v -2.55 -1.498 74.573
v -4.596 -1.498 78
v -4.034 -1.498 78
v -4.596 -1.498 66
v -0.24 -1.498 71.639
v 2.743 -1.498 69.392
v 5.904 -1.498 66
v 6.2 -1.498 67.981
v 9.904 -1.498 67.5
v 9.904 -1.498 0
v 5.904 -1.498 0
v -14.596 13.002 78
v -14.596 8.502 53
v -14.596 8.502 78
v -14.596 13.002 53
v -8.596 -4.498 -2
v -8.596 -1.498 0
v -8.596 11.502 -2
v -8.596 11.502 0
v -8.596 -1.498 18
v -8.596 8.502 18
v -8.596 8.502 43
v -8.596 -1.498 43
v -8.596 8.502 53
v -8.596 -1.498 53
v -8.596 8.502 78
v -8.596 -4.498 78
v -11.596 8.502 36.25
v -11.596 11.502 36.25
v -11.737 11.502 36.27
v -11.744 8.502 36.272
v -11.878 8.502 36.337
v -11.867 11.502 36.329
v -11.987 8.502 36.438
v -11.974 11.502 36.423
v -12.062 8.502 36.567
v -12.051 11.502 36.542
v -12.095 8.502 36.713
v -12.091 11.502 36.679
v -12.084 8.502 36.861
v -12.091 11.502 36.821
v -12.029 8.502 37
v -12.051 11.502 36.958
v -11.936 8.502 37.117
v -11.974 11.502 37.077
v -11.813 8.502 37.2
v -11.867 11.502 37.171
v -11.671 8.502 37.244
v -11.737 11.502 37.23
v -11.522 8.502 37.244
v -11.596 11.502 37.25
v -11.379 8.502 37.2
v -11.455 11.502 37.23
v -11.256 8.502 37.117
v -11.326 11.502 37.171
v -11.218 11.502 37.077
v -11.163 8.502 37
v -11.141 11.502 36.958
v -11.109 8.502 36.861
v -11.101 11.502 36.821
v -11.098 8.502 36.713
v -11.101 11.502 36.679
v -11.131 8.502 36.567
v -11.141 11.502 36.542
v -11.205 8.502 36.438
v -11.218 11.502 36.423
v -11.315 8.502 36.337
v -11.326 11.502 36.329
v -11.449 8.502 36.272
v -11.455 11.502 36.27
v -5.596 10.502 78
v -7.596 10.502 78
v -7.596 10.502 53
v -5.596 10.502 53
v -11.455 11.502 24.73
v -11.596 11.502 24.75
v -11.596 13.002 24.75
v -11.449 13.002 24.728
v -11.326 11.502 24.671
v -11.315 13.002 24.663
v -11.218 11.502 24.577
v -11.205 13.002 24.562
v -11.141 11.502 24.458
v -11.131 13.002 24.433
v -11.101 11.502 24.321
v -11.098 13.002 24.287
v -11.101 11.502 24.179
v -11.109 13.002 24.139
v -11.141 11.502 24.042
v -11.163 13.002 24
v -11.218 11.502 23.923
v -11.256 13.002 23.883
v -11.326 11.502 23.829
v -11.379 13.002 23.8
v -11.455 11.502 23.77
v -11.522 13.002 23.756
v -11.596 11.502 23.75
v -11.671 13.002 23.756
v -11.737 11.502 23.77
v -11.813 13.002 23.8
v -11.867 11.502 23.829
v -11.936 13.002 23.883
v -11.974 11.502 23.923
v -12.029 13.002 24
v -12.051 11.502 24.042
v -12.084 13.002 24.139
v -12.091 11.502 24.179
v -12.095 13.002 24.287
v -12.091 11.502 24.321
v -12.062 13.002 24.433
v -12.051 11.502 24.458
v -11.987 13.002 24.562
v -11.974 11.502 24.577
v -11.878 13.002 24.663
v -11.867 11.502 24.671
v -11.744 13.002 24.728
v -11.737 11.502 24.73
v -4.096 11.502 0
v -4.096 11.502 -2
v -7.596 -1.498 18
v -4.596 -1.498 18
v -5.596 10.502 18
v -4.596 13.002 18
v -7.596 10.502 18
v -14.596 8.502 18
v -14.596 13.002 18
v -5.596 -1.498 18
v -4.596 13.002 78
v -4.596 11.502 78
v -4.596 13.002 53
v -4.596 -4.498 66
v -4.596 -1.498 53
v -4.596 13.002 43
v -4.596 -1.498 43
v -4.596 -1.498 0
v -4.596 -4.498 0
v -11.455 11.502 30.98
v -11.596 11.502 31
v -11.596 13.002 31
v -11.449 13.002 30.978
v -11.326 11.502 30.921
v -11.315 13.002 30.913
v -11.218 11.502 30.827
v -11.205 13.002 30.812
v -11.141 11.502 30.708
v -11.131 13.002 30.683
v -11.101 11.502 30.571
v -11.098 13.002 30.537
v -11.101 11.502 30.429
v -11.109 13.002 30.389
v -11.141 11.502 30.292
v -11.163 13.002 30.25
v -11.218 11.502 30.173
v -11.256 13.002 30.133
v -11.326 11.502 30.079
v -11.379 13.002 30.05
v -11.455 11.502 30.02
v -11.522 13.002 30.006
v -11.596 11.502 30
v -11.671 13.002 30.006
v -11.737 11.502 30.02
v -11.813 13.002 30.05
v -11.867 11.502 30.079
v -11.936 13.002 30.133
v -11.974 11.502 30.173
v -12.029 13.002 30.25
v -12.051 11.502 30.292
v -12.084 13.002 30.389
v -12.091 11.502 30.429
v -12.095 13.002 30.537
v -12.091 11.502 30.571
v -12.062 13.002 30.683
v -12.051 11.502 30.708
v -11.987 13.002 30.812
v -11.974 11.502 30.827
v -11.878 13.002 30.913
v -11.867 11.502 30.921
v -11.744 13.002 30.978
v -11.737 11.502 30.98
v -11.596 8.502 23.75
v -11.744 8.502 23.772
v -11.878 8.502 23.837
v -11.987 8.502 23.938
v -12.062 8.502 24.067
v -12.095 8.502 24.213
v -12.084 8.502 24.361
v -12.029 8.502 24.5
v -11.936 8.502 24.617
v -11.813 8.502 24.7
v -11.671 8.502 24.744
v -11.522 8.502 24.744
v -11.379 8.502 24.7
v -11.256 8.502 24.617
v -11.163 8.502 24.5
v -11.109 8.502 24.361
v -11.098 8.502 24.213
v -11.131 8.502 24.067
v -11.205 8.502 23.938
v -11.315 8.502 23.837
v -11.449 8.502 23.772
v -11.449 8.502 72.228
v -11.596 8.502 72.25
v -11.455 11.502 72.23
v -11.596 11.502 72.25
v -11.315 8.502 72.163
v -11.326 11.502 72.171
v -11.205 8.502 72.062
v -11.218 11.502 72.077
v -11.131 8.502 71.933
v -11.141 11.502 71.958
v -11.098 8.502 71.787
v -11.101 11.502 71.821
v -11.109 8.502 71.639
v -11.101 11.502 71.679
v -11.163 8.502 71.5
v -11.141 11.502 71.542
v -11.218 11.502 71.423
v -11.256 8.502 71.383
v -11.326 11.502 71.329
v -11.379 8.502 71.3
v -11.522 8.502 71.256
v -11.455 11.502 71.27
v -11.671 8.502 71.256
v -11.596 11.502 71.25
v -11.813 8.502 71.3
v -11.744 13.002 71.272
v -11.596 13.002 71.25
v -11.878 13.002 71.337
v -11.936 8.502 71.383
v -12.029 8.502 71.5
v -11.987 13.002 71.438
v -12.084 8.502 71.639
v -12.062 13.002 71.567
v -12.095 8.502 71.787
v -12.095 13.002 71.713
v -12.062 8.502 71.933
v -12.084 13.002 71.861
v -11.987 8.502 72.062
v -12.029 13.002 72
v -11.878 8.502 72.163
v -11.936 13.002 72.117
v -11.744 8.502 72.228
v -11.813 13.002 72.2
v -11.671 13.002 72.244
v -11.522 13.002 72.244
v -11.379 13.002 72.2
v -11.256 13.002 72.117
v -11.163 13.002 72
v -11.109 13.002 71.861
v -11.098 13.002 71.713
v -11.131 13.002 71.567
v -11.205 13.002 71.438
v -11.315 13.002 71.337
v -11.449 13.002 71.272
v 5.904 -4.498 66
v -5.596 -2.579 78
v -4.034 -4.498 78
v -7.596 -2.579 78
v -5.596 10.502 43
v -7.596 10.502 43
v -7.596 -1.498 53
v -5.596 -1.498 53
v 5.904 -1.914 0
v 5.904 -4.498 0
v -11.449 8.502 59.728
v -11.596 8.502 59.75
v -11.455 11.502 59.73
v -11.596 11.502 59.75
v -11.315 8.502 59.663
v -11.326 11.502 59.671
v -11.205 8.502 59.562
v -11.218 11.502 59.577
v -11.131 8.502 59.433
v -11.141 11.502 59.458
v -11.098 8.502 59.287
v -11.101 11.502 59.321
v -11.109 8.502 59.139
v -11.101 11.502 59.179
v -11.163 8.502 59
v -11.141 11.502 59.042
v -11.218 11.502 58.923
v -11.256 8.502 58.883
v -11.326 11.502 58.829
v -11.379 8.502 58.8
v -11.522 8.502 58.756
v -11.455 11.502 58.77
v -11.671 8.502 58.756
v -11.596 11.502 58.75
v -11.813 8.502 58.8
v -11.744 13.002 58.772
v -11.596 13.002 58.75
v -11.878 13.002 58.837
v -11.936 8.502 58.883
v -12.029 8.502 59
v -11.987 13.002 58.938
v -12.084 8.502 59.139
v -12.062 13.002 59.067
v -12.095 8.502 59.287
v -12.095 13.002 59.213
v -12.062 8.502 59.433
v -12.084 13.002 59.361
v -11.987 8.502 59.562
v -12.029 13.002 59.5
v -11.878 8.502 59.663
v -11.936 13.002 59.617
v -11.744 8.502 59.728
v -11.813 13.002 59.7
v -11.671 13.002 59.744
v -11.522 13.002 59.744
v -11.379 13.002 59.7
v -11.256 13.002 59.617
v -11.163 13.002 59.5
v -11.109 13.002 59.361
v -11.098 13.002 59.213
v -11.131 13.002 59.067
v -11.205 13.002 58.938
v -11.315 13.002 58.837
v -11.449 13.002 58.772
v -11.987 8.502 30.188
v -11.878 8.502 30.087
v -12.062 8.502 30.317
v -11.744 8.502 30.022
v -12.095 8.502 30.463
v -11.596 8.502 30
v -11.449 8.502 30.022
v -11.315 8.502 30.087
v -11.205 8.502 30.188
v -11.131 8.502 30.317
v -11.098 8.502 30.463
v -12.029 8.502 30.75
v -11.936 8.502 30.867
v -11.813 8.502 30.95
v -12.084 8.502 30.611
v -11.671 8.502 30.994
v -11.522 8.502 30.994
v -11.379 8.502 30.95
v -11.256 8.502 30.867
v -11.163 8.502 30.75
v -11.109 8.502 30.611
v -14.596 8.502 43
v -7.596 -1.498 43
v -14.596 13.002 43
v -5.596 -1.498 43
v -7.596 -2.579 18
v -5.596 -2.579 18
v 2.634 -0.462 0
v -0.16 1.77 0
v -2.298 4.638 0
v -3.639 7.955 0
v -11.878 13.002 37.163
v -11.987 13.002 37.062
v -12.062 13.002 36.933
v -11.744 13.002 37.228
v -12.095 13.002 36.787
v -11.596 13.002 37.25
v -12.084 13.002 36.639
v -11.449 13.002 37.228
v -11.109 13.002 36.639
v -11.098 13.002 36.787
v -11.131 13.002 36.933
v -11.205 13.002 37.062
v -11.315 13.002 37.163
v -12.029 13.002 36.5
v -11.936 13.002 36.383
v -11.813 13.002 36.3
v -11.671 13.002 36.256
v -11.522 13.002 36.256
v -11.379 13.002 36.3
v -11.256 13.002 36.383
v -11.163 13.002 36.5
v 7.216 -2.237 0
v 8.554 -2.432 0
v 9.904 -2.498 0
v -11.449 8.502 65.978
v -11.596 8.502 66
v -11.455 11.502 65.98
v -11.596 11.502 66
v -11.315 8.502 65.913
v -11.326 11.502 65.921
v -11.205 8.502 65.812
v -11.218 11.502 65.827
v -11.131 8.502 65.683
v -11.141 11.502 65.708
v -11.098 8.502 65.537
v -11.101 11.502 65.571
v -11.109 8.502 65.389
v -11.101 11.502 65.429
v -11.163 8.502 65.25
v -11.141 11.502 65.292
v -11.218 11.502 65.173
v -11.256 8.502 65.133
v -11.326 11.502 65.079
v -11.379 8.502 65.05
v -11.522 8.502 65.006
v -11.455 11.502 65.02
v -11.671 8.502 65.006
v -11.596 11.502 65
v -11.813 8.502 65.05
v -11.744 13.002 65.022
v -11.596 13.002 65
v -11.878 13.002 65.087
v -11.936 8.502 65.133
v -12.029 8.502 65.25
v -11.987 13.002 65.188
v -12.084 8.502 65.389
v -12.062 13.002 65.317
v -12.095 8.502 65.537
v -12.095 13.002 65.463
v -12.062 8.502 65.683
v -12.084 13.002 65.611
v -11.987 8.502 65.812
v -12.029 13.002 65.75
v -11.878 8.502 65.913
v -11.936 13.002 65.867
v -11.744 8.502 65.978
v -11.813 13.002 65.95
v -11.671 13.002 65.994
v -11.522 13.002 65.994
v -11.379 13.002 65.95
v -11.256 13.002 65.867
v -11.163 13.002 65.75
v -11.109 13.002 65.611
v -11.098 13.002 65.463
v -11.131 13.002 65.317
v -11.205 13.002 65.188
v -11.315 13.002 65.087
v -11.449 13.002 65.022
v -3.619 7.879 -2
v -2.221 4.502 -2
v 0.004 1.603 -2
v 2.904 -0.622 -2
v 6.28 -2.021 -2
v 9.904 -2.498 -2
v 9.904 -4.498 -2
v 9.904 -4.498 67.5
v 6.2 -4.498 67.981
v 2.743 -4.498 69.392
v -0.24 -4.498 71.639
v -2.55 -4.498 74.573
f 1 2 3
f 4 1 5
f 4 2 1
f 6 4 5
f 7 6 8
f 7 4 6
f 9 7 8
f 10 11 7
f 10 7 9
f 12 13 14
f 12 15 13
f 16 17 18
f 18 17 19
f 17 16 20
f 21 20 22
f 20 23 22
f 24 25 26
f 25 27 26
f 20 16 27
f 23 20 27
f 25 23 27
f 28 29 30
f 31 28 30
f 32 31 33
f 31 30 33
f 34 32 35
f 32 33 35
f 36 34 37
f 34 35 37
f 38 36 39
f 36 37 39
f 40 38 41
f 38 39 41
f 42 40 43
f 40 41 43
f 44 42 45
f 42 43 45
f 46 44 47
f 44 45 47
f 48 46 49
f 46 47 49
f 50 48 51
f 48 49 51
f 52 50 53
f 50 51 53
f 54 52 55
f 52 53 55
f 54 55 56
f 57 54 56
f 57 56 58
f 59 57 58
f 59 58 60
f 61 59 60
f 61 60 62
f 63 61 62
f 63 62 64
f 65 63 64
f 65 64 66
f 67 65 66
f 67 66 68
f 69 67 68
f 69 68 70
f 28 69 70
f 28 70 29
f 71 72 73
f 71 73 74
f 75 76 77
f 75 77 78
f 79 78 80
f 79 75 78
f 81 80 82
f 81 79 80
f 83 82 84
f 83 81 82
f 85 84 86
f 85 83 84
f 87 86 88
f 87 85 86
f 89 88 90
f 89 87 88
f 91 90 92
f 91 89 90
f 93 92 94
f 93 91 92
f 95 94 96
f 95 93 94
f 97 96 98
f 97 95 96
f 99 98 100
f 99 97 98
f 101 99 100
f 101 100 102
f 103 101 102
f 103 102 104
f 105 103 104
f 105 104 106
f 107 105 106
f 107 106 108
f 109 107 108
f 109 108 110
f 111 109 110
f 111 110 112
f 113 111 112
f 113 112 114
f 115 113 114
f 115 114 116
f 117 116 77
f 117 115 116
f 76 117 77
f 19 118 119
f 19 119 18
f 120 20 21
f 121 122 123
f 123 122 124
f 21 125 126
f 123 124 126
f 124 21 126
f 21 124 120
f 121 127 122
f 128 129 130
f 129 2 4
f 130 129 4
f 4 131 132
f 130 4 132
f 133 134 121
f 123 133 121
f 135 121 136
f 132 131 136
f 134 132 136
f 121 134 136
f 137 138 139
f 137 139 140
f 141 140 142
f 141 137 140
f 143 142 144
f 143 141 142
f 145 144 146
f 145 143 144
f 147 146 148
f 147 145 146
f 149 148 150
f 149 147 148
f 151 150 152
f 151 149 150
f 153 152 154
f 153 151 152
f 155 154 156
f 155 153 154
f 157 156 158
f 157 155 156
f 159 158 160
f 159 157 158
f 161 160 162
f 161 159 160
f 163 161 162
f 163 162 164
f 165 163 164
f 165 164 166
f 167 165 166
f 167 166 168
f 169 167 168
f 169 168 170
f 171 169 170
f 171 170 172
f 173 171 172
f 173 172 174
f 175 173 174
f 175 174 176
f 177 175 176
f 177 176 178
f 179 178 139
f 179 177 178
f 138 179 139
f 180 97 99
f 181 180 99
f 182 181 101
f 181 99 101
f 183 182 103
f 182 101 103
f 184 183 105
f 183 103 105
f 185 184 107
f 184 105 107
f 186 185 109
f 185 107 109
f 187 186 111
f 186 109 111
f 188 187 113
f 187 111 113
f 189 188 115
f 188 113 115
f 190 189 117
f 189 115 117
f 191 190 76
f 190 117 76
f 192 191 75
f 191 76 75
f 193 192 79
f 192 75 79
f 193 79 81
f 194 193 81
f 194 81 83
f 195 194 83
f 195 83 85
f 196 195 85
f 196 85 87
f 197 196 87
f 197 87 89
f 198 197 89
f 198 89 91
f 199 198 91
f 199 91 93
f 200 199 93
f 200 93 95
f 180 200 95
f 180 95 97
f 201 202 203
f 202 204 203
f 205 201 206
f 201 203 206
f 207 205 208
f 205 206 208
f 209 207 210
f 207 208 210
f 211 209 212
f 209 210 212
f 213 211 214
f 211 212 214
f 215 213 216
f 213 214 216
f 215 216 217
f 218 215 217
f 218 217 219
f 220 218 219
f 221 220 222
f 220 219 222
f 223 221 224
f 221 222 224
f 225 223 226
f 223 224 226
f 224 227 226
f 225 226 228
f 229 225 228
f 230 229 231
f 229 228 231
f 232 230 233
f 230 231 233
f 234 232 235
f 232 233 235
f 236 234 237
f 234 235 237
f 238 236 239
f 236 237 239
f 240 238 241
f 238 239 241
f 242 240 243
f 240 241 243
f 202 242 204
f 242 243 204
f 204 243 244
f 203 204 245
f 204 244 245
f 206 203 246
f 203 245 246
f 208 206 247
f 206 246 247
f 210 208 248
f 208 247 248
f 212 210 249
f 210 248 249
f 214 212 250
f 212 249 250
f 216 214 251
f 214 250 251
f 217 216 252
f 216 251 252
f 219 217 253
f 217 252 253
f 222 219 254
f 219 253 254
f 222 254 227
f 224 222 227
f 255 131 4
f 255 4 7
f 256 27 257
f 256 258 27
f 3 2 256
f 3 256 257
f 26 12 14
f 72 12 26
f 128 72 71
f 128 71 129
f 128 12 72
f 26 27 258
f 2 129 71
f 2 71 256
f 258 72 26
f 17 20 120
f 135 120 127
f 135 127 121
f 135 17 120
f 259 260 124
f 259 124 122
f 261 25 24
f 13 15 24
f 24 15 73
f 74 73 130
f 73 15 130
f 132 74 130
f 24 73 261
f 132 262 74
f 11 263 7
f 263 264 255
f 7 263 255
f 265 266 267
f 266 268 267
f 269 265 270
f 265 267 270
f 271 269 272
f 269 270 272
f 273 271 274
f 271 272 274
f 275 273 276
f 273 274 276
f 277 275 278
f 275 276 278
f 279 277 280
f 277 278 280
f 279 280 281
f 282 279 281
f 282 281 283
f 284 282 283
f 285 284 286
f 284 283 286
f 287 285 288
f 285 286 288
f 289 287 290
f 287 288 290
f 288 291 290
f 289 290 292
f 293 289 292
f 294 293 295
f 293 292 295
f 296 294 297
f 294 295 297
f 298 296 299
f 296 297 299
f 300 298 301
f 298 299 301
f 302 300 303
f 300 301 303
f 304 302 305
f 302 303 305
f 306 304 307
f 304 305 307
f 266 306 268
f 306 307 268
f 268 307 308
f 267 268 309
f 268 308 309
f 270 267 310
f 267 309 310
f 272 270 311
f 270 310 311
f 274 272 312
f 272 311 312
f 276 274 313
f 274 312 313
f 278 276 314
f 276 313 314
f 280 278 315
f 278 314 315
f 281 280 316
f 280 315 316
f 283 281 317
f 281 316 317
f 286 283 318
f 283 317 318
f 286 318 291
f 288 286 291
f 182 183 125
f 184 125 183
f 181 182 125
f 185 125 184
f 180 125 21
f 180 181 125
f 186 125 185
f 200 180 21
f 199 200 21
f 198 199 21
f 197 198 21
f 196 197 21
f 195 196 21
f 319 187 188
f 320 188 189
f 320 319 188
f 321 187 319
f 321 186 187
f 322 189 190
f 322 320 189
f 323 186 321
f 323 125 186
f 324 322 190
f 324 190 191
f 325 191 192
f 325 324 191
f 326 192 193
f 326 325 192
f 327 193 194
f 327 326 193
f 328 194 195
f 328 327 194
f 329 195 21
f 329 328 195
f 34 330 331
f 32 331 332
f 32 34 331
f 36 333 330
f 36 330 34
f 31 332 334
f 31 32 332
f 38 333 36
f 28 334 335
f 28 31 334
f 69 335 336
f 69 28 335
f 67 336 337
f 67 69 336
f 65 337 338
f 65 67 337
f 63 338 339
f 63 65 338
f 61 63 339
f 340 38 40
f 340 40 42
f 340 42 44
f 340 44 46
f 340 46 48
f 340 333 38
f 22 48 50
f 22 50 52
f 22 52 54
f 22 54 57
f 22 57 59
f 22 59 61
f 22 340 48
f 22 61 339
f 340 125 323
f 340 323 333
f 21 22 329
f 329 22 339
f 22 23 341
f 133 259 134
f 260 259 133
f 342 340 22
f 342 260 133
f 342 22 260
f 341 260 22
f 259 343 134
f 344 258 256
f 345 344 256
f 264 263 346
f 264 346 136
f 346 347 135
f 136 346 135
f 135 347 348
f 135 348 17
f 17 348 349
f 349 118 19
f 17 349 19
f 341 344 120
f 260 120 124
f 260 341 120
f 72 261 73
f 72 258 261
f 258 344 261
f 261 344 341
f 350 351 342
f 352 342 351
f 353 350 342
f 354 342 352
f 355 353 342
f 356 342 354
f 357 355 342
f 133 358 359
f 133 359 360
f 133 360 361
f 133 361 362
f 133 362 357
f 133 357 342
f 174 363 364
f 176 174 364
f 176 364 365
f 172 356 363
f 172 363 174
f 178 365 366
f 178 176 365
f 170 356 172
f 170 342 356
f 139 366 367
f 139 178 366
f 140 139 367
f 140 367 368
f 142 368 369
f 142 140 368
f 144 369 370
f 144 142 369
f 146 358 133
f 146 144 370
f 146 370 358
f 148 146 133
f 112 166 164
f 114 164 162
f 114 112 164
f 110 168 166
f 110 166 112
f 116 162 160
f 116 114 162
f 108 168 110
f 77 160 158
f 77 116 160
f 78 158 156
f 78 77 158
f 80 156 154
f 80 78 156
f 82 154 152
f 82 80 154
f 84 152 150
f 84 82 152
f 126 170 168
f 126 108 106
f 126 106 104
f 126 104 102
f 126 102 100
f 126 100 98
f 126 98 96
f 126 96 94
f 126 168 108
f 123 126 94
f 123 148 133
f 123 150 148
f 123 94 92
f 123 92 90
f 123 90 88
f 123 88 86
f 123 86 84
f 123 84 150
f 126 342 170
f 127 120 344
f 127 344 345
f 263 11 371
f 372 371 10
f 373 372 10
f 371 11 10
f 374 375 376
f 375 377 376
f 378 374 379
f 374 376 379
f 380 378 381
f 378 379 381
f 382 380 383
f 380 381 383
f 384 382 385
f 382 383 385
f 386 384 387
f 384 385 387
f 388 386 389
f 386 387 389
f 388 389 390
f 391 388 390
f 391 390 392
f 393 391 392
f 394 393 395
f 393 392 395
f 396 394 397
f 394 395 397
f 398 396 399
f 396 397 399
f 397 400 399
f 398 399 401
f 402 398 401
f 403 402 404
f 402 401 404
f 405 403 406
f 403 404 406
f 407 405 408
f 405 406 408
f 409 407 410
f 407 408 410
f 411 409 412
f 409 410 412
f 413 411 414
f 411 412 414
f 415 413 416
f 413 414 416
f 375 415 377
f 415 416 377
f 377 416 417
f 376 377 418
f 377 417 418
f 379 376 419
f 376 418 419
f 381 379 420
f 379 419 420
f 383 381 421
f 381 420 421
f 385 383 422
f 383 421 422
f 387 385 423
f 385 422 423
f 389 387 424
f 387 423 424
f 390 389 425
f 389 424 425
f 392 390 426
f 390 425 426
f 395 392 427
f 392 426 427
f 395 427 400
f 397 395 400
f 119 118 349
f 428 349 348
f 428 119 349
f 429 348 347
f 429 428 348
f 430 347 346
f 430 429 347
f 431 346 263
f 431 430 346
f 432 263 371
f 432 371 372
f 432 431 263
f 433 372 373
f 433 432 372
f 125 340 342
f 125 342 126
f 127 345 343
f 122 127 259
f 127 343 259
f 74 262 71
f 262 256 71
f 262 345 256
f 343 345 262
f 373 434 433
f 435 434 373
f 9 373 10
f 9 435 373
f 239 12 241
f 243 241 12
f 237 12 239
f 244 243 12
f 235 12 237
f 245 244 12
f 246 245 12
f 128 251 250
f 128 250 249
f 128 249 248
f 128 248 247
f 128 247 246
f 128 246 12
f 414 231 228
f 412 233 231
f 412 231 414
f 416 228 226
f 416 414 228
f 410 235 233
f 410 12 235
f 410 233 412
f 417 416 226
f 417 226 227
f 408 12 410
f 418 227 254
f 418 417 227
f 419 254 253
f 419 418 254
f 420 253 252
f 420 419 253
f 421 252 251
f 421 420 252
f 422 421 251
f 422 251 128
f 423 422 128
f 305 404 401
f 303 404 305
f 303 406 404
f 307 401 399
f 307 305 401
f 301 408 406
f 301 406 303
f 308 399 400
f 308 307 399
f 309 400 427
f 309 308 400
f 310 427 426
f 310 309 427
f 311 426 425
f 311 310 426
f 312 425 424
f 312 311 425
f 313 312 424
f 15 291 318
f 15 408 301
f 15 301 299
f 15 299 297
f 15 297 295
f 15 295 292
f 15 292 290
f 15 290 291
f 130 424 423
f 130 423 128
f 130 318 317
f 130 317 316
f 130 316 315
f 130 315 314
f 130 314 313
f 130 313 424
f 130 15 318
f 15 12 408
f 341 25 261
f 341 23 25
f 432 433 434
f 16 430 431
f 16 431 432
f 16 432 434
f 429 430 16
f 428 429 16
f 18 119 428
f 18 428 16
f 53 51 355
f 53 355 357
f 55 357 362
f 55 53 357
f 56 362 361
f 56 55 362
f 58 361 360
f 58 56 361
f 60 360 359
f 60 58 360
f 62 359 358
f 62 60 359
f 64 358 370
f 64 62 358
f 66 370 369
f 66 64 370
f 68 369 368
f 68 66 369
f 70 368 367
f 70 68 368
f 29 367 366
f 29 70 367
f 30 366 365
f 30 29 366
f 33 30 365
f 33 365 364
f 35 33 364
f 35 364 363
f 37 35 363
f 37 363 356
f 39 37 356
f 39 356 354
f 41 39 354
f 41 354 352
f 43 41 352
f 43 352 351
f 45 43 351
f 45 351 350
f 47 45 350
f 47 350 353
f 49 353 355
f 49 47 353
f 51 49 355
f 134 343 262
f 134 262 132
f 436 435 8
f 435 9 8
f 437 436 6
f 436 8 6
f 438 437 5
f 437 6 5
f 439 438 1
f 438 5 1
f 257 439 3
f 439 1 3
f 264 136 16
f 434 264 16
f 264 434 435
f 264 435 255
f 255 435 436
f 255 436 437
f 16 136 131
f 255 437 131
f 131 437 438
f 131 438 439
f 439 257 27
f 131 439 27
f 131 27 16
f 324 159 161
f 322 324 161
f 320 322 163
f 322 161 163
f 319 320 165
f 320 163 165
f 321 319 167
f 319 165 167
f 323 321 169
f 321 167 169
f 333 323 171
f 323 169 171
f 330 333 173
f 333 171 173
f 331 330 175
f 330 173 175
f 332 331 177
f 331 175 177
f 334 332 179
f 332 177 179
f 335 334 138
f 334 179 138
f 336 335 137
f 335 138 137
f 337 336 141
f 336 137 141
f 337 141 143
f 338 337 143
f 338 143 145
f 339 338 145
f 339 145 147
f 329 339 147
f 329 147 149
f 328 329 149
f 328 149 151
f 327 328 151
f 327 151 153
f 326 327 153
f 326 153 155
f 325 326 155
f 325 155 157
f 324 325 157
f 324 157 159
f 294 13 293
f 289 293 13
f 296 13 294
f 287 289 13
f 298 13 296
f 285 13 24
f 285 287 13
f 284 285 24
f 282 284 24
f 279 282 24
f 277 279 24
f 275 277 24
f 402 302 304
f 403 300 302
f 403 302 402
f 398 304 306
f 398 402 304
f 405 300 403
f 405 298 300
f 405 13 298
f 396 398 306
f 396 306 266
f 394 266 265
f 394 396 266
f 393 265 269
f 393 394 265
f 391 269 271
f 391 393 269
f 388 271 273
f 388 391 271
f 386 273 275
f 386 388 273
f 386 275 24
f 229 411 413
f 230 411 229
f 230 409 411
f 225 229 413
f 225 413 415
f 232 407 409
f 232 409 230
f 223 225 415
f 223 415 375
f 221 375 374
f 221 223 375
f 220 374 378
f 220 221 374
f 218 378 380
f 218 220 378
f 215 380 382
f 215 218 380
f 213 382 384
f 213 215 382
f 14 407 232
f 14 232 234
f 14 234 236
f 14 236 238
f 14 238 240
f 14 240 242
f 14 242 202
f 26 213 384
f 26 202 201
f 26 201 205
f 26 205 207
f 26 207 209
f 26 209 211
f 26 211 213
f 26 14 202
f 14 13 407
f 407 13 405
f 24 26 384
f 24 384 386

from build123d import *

# Parameters (mm, degrees)
SALIENTE_EXTRUIR1_DEPTH = 82
CROQUIS3_W              = 10
CROQUIS3_H              = 25
SALIENTE_EXTRUIR2_DEPTH = 1.5
CROQUIS4_W              = 18.5
CROQUIS4_H              = 16
SALIENTE_EXTRUIR3_DEPTH = 2
CROQUIS5_R              = 14.5
CORTAR_EXTRUIR1_DEPTH   = 10
CROQUIS9_R              = 0.5
CORTAR_EXTRUIR5_DEPTH   = 10
CORTAR_EXTRUIR6_DEPTH   = 2
CROQUIS11_W             = 10
CROQUIS11_H             = 13
CROQUIS11_W_2           = 18
CROQUIS11_W_3           = 8.121089167
CROQUIS11_H_2           = 20.058238939
CORTAR_EXTRUIR7_DEPTH   = 10
CROQUIS12_W             = 2
CROQUIS12_H             = 13.081043671
CORTAR_EXTRUIR8_DEPTH   = 60
CROQUIS13_W             = 10.5
CROQUIS13_H             = 66
CORTAR_EXTRUIR9_DEPTH   = 12
CROQUIS14_W             = 6
CROQUIS14_H             = 25
SALIENTE_EXTRUIR4_DEPTH = 3
CROQUIS15_R             = 0.5
CORTAR_EXTRUIR10_DEPTH  = 81.950919234


with BuildPart() as part:
    # Croquis2 → Saliente-Extruir1 (new body)
    with BuildSketch(Plane.XY):
        Polygon((-4.596277774, 11.502403514), (-4.596277774, -1.497596486), (9.903722226, -1.497596486), (9.903722226, -4.497596486), (-4.596277774, -4.497596486), (-8.596277774, -4.497596486), (-8.596277774, 11.502403514), align=None)
    extrude(amount=SALIENTE_EXTRUIR1_DEPTH)

    # Croquis3 → Saliente-Extruir2 (add)
    with BuildSketch(Plane(origin=(0, 11.502403514, 0), x_dir=(1, 0, 0), z_dir=(0, 1, 0))):
        with Locations((-9.596277774, -30.5)):
            Rectangle(CROQUIS3_W, CROQUIS3_H)
        with Locations((-9.596277774, -65.5)):
            Rectangle(CROQUIS3_W, CROQUIS3_H)
    extrude(amount=SALIENTE_EXTRUIR2_DEPTH)

    # Croquis4 → Saliente-Extruir3 (add)
    with BuildSketch(Plane(origin=(0, 0, 0), x_dir=(-1, 0, 0), z_dir=(0, 0, -1))):
        with Locations((-0.653722226, 3.502403514)):
            Rectangle(CROQUIS4_W, CROQUIS4_H)
    extrude(amount=SALIENTE_EXTRUIR3_DEPTH)

    # Croquis5 → Cortar-Extruir1 (cut)
    with BuildSketch(Plane(origin=(0, -1.497596486, 0), x_dir=(1, 0, 0), z_dir=(0, 1, 0))):
        with Locations((9.903722226, -82)):
            Circle(CROQUIS5_R)
    extrude(amount=-CORTAR_EXTRUIR1_DEPTH, mode=Mode.SUBTRACT)

    # Croquis9 → Cortar-Extruir5 (cut)
    with BuildSketch(Plane.XZ.offset(-11.502403514)):
        with Locations(Location((-11.596277774, 65.5, 0), (0, 0, 270))):
            Circle(CROQUIS9_R)
        with Locations(Location((-11.596277774, 59.25, 0), (0, 0, 270))):
            Circle(CROQUIS9_R)
        with Locations(Location((-11.596277774, 71.75, 0), (0, 0, 270))):
            Circle(CROQUIS9_R)
    cortar_extruir5 = extrude(amount=-CORTAR_EXTRUIR5_DEPTH, mode=Mode.SUBTRACT)

    # Simetría1: Cortar-Extruir5 across plane
    add(cortar_extruir5.mirror(Plane(origin=(0, 0, 48), x_dir=(1, 0, 0), z_dir=(0, 0, -1))), mode=Mode.SUBTRACT)

    # Croquis10 → Cortar-Extruir6 (cut)
    with BuildSketch(Plane(origin=(0, 0, -2), x_dir=(-1, 0, 0), z_dir=(0, 0, -1))):
        with BuildLine():
            Line((-9.903722226, -2.497596486), (-9.903722226, 11.502403514))
            Line((-9.903722226, 11.502403514), (4.096277774, 11.502403514))
            ThreePointArc((4.096277774, 11.502403514), (-0.00422729, 1.602908577), (-9.903722226, -2.497596486))
        make_face()
    extrude(amount=-CORTAR_EXTRUIR6_DEPTH, mode=Mode.SUBTRACT)

    # Croquis11 → Cortar-Extruir7 (cut)
    with BuildSketch(Plane.ZY.offset(8.596277774)):
        with Locations((48, 5.002403514)):
            Rectangle(CROQUIS11_W, CROQUIS11_H)
        with Locations((9, 5.002403514)):
            Rectangle(CROQUIS11_W_2, CROQUIS11_H)
        with Locations((82.060544584, 1.473284045)):
            Rectangle(CROQUIS11_W_3, CROQUIS11_H_2)
    extrude(amount=-CORTAR_EXTRUIR7_DEPTH, mode=Mode.SUBTRACT)

    # Croquis12 → Cortar-Extruir8 (cut)
    with BuildSketch(Plane.XY.offset(78)):
        with Locations((-6.596277774, 3.961881679)):
            Rectangle(CROQUIS12_W, CROQUIS12_H)
    extrude(amount=-CORTAR_EXTRUIR8_DEPTH, mode=Mode.SUBTRACT)

    # Croquis13 → Cortar-Extruir9 (cut)
    with BuildSketch(Plane.XZ.offset(4.497596486)):
        with Locations((0.653722226, 33)):
            Rectangle(CROQUIS13_W, CROQUIS13_H)
    extrude(amount=-CORTAR_EXTRUIR9_DEPTH, mode=Mode.SUBTRACT)

    # Croquis14 → Saliente-Extruir4 (add)
    with BuildSketch(Plane.XZ.offset(-11.502403514)):
        with Locations((-11.596277774, 65.5)):
            Rectangle(CROQUIS14_W, CROQUIS14_H)
        with Locations((-11.596277774, 30.5)):
            Rectangle(CROQUIS14_W, CROQUIS14_H)
    extrude(amount=SALIENTE_EXTRUIR4_DEPTH)

    # Croquis15 → Cortar-Extruir10 (cut, through all)
    with BuildSketch(Plane(origin=(0, 11.502403514, 0), x_dir=(1, 0, 0), z_dir=(0, 1, 0))):
        with Locations(Location((-11.596277774, -24.25, 0), (0, 0, 90))):
            Circle(CROQUIS15_R)
        with Locations(Location((-11.596277774, -30.5, 0), (0, 0, 90))):
            Circle(CROQUIS15_R)
        with Locations(Location((-11.596277774, -36.75, 0), (0, 0, 90))):
            Circle(CROQUIS15_R)
        with Locations(Location((-11.596277774, -65.5, 0), (0, 0, 270))):
            Circle(CROQUIS15_R)
        with Locations(Location((-11.596277774, -59.25, 0), (0, 0, 270))):
            Circle(CROQUIS15_R)
        with Locations(Location((-11.596277774, -71.75, 0), (0, 0, 270))):
            Circle(CROQUIS15_R)
    extrude(amount=-CORTAR_EXTRUIR10_DEPTH, mode=Mode.SUBTRACT)


solid = part.part
